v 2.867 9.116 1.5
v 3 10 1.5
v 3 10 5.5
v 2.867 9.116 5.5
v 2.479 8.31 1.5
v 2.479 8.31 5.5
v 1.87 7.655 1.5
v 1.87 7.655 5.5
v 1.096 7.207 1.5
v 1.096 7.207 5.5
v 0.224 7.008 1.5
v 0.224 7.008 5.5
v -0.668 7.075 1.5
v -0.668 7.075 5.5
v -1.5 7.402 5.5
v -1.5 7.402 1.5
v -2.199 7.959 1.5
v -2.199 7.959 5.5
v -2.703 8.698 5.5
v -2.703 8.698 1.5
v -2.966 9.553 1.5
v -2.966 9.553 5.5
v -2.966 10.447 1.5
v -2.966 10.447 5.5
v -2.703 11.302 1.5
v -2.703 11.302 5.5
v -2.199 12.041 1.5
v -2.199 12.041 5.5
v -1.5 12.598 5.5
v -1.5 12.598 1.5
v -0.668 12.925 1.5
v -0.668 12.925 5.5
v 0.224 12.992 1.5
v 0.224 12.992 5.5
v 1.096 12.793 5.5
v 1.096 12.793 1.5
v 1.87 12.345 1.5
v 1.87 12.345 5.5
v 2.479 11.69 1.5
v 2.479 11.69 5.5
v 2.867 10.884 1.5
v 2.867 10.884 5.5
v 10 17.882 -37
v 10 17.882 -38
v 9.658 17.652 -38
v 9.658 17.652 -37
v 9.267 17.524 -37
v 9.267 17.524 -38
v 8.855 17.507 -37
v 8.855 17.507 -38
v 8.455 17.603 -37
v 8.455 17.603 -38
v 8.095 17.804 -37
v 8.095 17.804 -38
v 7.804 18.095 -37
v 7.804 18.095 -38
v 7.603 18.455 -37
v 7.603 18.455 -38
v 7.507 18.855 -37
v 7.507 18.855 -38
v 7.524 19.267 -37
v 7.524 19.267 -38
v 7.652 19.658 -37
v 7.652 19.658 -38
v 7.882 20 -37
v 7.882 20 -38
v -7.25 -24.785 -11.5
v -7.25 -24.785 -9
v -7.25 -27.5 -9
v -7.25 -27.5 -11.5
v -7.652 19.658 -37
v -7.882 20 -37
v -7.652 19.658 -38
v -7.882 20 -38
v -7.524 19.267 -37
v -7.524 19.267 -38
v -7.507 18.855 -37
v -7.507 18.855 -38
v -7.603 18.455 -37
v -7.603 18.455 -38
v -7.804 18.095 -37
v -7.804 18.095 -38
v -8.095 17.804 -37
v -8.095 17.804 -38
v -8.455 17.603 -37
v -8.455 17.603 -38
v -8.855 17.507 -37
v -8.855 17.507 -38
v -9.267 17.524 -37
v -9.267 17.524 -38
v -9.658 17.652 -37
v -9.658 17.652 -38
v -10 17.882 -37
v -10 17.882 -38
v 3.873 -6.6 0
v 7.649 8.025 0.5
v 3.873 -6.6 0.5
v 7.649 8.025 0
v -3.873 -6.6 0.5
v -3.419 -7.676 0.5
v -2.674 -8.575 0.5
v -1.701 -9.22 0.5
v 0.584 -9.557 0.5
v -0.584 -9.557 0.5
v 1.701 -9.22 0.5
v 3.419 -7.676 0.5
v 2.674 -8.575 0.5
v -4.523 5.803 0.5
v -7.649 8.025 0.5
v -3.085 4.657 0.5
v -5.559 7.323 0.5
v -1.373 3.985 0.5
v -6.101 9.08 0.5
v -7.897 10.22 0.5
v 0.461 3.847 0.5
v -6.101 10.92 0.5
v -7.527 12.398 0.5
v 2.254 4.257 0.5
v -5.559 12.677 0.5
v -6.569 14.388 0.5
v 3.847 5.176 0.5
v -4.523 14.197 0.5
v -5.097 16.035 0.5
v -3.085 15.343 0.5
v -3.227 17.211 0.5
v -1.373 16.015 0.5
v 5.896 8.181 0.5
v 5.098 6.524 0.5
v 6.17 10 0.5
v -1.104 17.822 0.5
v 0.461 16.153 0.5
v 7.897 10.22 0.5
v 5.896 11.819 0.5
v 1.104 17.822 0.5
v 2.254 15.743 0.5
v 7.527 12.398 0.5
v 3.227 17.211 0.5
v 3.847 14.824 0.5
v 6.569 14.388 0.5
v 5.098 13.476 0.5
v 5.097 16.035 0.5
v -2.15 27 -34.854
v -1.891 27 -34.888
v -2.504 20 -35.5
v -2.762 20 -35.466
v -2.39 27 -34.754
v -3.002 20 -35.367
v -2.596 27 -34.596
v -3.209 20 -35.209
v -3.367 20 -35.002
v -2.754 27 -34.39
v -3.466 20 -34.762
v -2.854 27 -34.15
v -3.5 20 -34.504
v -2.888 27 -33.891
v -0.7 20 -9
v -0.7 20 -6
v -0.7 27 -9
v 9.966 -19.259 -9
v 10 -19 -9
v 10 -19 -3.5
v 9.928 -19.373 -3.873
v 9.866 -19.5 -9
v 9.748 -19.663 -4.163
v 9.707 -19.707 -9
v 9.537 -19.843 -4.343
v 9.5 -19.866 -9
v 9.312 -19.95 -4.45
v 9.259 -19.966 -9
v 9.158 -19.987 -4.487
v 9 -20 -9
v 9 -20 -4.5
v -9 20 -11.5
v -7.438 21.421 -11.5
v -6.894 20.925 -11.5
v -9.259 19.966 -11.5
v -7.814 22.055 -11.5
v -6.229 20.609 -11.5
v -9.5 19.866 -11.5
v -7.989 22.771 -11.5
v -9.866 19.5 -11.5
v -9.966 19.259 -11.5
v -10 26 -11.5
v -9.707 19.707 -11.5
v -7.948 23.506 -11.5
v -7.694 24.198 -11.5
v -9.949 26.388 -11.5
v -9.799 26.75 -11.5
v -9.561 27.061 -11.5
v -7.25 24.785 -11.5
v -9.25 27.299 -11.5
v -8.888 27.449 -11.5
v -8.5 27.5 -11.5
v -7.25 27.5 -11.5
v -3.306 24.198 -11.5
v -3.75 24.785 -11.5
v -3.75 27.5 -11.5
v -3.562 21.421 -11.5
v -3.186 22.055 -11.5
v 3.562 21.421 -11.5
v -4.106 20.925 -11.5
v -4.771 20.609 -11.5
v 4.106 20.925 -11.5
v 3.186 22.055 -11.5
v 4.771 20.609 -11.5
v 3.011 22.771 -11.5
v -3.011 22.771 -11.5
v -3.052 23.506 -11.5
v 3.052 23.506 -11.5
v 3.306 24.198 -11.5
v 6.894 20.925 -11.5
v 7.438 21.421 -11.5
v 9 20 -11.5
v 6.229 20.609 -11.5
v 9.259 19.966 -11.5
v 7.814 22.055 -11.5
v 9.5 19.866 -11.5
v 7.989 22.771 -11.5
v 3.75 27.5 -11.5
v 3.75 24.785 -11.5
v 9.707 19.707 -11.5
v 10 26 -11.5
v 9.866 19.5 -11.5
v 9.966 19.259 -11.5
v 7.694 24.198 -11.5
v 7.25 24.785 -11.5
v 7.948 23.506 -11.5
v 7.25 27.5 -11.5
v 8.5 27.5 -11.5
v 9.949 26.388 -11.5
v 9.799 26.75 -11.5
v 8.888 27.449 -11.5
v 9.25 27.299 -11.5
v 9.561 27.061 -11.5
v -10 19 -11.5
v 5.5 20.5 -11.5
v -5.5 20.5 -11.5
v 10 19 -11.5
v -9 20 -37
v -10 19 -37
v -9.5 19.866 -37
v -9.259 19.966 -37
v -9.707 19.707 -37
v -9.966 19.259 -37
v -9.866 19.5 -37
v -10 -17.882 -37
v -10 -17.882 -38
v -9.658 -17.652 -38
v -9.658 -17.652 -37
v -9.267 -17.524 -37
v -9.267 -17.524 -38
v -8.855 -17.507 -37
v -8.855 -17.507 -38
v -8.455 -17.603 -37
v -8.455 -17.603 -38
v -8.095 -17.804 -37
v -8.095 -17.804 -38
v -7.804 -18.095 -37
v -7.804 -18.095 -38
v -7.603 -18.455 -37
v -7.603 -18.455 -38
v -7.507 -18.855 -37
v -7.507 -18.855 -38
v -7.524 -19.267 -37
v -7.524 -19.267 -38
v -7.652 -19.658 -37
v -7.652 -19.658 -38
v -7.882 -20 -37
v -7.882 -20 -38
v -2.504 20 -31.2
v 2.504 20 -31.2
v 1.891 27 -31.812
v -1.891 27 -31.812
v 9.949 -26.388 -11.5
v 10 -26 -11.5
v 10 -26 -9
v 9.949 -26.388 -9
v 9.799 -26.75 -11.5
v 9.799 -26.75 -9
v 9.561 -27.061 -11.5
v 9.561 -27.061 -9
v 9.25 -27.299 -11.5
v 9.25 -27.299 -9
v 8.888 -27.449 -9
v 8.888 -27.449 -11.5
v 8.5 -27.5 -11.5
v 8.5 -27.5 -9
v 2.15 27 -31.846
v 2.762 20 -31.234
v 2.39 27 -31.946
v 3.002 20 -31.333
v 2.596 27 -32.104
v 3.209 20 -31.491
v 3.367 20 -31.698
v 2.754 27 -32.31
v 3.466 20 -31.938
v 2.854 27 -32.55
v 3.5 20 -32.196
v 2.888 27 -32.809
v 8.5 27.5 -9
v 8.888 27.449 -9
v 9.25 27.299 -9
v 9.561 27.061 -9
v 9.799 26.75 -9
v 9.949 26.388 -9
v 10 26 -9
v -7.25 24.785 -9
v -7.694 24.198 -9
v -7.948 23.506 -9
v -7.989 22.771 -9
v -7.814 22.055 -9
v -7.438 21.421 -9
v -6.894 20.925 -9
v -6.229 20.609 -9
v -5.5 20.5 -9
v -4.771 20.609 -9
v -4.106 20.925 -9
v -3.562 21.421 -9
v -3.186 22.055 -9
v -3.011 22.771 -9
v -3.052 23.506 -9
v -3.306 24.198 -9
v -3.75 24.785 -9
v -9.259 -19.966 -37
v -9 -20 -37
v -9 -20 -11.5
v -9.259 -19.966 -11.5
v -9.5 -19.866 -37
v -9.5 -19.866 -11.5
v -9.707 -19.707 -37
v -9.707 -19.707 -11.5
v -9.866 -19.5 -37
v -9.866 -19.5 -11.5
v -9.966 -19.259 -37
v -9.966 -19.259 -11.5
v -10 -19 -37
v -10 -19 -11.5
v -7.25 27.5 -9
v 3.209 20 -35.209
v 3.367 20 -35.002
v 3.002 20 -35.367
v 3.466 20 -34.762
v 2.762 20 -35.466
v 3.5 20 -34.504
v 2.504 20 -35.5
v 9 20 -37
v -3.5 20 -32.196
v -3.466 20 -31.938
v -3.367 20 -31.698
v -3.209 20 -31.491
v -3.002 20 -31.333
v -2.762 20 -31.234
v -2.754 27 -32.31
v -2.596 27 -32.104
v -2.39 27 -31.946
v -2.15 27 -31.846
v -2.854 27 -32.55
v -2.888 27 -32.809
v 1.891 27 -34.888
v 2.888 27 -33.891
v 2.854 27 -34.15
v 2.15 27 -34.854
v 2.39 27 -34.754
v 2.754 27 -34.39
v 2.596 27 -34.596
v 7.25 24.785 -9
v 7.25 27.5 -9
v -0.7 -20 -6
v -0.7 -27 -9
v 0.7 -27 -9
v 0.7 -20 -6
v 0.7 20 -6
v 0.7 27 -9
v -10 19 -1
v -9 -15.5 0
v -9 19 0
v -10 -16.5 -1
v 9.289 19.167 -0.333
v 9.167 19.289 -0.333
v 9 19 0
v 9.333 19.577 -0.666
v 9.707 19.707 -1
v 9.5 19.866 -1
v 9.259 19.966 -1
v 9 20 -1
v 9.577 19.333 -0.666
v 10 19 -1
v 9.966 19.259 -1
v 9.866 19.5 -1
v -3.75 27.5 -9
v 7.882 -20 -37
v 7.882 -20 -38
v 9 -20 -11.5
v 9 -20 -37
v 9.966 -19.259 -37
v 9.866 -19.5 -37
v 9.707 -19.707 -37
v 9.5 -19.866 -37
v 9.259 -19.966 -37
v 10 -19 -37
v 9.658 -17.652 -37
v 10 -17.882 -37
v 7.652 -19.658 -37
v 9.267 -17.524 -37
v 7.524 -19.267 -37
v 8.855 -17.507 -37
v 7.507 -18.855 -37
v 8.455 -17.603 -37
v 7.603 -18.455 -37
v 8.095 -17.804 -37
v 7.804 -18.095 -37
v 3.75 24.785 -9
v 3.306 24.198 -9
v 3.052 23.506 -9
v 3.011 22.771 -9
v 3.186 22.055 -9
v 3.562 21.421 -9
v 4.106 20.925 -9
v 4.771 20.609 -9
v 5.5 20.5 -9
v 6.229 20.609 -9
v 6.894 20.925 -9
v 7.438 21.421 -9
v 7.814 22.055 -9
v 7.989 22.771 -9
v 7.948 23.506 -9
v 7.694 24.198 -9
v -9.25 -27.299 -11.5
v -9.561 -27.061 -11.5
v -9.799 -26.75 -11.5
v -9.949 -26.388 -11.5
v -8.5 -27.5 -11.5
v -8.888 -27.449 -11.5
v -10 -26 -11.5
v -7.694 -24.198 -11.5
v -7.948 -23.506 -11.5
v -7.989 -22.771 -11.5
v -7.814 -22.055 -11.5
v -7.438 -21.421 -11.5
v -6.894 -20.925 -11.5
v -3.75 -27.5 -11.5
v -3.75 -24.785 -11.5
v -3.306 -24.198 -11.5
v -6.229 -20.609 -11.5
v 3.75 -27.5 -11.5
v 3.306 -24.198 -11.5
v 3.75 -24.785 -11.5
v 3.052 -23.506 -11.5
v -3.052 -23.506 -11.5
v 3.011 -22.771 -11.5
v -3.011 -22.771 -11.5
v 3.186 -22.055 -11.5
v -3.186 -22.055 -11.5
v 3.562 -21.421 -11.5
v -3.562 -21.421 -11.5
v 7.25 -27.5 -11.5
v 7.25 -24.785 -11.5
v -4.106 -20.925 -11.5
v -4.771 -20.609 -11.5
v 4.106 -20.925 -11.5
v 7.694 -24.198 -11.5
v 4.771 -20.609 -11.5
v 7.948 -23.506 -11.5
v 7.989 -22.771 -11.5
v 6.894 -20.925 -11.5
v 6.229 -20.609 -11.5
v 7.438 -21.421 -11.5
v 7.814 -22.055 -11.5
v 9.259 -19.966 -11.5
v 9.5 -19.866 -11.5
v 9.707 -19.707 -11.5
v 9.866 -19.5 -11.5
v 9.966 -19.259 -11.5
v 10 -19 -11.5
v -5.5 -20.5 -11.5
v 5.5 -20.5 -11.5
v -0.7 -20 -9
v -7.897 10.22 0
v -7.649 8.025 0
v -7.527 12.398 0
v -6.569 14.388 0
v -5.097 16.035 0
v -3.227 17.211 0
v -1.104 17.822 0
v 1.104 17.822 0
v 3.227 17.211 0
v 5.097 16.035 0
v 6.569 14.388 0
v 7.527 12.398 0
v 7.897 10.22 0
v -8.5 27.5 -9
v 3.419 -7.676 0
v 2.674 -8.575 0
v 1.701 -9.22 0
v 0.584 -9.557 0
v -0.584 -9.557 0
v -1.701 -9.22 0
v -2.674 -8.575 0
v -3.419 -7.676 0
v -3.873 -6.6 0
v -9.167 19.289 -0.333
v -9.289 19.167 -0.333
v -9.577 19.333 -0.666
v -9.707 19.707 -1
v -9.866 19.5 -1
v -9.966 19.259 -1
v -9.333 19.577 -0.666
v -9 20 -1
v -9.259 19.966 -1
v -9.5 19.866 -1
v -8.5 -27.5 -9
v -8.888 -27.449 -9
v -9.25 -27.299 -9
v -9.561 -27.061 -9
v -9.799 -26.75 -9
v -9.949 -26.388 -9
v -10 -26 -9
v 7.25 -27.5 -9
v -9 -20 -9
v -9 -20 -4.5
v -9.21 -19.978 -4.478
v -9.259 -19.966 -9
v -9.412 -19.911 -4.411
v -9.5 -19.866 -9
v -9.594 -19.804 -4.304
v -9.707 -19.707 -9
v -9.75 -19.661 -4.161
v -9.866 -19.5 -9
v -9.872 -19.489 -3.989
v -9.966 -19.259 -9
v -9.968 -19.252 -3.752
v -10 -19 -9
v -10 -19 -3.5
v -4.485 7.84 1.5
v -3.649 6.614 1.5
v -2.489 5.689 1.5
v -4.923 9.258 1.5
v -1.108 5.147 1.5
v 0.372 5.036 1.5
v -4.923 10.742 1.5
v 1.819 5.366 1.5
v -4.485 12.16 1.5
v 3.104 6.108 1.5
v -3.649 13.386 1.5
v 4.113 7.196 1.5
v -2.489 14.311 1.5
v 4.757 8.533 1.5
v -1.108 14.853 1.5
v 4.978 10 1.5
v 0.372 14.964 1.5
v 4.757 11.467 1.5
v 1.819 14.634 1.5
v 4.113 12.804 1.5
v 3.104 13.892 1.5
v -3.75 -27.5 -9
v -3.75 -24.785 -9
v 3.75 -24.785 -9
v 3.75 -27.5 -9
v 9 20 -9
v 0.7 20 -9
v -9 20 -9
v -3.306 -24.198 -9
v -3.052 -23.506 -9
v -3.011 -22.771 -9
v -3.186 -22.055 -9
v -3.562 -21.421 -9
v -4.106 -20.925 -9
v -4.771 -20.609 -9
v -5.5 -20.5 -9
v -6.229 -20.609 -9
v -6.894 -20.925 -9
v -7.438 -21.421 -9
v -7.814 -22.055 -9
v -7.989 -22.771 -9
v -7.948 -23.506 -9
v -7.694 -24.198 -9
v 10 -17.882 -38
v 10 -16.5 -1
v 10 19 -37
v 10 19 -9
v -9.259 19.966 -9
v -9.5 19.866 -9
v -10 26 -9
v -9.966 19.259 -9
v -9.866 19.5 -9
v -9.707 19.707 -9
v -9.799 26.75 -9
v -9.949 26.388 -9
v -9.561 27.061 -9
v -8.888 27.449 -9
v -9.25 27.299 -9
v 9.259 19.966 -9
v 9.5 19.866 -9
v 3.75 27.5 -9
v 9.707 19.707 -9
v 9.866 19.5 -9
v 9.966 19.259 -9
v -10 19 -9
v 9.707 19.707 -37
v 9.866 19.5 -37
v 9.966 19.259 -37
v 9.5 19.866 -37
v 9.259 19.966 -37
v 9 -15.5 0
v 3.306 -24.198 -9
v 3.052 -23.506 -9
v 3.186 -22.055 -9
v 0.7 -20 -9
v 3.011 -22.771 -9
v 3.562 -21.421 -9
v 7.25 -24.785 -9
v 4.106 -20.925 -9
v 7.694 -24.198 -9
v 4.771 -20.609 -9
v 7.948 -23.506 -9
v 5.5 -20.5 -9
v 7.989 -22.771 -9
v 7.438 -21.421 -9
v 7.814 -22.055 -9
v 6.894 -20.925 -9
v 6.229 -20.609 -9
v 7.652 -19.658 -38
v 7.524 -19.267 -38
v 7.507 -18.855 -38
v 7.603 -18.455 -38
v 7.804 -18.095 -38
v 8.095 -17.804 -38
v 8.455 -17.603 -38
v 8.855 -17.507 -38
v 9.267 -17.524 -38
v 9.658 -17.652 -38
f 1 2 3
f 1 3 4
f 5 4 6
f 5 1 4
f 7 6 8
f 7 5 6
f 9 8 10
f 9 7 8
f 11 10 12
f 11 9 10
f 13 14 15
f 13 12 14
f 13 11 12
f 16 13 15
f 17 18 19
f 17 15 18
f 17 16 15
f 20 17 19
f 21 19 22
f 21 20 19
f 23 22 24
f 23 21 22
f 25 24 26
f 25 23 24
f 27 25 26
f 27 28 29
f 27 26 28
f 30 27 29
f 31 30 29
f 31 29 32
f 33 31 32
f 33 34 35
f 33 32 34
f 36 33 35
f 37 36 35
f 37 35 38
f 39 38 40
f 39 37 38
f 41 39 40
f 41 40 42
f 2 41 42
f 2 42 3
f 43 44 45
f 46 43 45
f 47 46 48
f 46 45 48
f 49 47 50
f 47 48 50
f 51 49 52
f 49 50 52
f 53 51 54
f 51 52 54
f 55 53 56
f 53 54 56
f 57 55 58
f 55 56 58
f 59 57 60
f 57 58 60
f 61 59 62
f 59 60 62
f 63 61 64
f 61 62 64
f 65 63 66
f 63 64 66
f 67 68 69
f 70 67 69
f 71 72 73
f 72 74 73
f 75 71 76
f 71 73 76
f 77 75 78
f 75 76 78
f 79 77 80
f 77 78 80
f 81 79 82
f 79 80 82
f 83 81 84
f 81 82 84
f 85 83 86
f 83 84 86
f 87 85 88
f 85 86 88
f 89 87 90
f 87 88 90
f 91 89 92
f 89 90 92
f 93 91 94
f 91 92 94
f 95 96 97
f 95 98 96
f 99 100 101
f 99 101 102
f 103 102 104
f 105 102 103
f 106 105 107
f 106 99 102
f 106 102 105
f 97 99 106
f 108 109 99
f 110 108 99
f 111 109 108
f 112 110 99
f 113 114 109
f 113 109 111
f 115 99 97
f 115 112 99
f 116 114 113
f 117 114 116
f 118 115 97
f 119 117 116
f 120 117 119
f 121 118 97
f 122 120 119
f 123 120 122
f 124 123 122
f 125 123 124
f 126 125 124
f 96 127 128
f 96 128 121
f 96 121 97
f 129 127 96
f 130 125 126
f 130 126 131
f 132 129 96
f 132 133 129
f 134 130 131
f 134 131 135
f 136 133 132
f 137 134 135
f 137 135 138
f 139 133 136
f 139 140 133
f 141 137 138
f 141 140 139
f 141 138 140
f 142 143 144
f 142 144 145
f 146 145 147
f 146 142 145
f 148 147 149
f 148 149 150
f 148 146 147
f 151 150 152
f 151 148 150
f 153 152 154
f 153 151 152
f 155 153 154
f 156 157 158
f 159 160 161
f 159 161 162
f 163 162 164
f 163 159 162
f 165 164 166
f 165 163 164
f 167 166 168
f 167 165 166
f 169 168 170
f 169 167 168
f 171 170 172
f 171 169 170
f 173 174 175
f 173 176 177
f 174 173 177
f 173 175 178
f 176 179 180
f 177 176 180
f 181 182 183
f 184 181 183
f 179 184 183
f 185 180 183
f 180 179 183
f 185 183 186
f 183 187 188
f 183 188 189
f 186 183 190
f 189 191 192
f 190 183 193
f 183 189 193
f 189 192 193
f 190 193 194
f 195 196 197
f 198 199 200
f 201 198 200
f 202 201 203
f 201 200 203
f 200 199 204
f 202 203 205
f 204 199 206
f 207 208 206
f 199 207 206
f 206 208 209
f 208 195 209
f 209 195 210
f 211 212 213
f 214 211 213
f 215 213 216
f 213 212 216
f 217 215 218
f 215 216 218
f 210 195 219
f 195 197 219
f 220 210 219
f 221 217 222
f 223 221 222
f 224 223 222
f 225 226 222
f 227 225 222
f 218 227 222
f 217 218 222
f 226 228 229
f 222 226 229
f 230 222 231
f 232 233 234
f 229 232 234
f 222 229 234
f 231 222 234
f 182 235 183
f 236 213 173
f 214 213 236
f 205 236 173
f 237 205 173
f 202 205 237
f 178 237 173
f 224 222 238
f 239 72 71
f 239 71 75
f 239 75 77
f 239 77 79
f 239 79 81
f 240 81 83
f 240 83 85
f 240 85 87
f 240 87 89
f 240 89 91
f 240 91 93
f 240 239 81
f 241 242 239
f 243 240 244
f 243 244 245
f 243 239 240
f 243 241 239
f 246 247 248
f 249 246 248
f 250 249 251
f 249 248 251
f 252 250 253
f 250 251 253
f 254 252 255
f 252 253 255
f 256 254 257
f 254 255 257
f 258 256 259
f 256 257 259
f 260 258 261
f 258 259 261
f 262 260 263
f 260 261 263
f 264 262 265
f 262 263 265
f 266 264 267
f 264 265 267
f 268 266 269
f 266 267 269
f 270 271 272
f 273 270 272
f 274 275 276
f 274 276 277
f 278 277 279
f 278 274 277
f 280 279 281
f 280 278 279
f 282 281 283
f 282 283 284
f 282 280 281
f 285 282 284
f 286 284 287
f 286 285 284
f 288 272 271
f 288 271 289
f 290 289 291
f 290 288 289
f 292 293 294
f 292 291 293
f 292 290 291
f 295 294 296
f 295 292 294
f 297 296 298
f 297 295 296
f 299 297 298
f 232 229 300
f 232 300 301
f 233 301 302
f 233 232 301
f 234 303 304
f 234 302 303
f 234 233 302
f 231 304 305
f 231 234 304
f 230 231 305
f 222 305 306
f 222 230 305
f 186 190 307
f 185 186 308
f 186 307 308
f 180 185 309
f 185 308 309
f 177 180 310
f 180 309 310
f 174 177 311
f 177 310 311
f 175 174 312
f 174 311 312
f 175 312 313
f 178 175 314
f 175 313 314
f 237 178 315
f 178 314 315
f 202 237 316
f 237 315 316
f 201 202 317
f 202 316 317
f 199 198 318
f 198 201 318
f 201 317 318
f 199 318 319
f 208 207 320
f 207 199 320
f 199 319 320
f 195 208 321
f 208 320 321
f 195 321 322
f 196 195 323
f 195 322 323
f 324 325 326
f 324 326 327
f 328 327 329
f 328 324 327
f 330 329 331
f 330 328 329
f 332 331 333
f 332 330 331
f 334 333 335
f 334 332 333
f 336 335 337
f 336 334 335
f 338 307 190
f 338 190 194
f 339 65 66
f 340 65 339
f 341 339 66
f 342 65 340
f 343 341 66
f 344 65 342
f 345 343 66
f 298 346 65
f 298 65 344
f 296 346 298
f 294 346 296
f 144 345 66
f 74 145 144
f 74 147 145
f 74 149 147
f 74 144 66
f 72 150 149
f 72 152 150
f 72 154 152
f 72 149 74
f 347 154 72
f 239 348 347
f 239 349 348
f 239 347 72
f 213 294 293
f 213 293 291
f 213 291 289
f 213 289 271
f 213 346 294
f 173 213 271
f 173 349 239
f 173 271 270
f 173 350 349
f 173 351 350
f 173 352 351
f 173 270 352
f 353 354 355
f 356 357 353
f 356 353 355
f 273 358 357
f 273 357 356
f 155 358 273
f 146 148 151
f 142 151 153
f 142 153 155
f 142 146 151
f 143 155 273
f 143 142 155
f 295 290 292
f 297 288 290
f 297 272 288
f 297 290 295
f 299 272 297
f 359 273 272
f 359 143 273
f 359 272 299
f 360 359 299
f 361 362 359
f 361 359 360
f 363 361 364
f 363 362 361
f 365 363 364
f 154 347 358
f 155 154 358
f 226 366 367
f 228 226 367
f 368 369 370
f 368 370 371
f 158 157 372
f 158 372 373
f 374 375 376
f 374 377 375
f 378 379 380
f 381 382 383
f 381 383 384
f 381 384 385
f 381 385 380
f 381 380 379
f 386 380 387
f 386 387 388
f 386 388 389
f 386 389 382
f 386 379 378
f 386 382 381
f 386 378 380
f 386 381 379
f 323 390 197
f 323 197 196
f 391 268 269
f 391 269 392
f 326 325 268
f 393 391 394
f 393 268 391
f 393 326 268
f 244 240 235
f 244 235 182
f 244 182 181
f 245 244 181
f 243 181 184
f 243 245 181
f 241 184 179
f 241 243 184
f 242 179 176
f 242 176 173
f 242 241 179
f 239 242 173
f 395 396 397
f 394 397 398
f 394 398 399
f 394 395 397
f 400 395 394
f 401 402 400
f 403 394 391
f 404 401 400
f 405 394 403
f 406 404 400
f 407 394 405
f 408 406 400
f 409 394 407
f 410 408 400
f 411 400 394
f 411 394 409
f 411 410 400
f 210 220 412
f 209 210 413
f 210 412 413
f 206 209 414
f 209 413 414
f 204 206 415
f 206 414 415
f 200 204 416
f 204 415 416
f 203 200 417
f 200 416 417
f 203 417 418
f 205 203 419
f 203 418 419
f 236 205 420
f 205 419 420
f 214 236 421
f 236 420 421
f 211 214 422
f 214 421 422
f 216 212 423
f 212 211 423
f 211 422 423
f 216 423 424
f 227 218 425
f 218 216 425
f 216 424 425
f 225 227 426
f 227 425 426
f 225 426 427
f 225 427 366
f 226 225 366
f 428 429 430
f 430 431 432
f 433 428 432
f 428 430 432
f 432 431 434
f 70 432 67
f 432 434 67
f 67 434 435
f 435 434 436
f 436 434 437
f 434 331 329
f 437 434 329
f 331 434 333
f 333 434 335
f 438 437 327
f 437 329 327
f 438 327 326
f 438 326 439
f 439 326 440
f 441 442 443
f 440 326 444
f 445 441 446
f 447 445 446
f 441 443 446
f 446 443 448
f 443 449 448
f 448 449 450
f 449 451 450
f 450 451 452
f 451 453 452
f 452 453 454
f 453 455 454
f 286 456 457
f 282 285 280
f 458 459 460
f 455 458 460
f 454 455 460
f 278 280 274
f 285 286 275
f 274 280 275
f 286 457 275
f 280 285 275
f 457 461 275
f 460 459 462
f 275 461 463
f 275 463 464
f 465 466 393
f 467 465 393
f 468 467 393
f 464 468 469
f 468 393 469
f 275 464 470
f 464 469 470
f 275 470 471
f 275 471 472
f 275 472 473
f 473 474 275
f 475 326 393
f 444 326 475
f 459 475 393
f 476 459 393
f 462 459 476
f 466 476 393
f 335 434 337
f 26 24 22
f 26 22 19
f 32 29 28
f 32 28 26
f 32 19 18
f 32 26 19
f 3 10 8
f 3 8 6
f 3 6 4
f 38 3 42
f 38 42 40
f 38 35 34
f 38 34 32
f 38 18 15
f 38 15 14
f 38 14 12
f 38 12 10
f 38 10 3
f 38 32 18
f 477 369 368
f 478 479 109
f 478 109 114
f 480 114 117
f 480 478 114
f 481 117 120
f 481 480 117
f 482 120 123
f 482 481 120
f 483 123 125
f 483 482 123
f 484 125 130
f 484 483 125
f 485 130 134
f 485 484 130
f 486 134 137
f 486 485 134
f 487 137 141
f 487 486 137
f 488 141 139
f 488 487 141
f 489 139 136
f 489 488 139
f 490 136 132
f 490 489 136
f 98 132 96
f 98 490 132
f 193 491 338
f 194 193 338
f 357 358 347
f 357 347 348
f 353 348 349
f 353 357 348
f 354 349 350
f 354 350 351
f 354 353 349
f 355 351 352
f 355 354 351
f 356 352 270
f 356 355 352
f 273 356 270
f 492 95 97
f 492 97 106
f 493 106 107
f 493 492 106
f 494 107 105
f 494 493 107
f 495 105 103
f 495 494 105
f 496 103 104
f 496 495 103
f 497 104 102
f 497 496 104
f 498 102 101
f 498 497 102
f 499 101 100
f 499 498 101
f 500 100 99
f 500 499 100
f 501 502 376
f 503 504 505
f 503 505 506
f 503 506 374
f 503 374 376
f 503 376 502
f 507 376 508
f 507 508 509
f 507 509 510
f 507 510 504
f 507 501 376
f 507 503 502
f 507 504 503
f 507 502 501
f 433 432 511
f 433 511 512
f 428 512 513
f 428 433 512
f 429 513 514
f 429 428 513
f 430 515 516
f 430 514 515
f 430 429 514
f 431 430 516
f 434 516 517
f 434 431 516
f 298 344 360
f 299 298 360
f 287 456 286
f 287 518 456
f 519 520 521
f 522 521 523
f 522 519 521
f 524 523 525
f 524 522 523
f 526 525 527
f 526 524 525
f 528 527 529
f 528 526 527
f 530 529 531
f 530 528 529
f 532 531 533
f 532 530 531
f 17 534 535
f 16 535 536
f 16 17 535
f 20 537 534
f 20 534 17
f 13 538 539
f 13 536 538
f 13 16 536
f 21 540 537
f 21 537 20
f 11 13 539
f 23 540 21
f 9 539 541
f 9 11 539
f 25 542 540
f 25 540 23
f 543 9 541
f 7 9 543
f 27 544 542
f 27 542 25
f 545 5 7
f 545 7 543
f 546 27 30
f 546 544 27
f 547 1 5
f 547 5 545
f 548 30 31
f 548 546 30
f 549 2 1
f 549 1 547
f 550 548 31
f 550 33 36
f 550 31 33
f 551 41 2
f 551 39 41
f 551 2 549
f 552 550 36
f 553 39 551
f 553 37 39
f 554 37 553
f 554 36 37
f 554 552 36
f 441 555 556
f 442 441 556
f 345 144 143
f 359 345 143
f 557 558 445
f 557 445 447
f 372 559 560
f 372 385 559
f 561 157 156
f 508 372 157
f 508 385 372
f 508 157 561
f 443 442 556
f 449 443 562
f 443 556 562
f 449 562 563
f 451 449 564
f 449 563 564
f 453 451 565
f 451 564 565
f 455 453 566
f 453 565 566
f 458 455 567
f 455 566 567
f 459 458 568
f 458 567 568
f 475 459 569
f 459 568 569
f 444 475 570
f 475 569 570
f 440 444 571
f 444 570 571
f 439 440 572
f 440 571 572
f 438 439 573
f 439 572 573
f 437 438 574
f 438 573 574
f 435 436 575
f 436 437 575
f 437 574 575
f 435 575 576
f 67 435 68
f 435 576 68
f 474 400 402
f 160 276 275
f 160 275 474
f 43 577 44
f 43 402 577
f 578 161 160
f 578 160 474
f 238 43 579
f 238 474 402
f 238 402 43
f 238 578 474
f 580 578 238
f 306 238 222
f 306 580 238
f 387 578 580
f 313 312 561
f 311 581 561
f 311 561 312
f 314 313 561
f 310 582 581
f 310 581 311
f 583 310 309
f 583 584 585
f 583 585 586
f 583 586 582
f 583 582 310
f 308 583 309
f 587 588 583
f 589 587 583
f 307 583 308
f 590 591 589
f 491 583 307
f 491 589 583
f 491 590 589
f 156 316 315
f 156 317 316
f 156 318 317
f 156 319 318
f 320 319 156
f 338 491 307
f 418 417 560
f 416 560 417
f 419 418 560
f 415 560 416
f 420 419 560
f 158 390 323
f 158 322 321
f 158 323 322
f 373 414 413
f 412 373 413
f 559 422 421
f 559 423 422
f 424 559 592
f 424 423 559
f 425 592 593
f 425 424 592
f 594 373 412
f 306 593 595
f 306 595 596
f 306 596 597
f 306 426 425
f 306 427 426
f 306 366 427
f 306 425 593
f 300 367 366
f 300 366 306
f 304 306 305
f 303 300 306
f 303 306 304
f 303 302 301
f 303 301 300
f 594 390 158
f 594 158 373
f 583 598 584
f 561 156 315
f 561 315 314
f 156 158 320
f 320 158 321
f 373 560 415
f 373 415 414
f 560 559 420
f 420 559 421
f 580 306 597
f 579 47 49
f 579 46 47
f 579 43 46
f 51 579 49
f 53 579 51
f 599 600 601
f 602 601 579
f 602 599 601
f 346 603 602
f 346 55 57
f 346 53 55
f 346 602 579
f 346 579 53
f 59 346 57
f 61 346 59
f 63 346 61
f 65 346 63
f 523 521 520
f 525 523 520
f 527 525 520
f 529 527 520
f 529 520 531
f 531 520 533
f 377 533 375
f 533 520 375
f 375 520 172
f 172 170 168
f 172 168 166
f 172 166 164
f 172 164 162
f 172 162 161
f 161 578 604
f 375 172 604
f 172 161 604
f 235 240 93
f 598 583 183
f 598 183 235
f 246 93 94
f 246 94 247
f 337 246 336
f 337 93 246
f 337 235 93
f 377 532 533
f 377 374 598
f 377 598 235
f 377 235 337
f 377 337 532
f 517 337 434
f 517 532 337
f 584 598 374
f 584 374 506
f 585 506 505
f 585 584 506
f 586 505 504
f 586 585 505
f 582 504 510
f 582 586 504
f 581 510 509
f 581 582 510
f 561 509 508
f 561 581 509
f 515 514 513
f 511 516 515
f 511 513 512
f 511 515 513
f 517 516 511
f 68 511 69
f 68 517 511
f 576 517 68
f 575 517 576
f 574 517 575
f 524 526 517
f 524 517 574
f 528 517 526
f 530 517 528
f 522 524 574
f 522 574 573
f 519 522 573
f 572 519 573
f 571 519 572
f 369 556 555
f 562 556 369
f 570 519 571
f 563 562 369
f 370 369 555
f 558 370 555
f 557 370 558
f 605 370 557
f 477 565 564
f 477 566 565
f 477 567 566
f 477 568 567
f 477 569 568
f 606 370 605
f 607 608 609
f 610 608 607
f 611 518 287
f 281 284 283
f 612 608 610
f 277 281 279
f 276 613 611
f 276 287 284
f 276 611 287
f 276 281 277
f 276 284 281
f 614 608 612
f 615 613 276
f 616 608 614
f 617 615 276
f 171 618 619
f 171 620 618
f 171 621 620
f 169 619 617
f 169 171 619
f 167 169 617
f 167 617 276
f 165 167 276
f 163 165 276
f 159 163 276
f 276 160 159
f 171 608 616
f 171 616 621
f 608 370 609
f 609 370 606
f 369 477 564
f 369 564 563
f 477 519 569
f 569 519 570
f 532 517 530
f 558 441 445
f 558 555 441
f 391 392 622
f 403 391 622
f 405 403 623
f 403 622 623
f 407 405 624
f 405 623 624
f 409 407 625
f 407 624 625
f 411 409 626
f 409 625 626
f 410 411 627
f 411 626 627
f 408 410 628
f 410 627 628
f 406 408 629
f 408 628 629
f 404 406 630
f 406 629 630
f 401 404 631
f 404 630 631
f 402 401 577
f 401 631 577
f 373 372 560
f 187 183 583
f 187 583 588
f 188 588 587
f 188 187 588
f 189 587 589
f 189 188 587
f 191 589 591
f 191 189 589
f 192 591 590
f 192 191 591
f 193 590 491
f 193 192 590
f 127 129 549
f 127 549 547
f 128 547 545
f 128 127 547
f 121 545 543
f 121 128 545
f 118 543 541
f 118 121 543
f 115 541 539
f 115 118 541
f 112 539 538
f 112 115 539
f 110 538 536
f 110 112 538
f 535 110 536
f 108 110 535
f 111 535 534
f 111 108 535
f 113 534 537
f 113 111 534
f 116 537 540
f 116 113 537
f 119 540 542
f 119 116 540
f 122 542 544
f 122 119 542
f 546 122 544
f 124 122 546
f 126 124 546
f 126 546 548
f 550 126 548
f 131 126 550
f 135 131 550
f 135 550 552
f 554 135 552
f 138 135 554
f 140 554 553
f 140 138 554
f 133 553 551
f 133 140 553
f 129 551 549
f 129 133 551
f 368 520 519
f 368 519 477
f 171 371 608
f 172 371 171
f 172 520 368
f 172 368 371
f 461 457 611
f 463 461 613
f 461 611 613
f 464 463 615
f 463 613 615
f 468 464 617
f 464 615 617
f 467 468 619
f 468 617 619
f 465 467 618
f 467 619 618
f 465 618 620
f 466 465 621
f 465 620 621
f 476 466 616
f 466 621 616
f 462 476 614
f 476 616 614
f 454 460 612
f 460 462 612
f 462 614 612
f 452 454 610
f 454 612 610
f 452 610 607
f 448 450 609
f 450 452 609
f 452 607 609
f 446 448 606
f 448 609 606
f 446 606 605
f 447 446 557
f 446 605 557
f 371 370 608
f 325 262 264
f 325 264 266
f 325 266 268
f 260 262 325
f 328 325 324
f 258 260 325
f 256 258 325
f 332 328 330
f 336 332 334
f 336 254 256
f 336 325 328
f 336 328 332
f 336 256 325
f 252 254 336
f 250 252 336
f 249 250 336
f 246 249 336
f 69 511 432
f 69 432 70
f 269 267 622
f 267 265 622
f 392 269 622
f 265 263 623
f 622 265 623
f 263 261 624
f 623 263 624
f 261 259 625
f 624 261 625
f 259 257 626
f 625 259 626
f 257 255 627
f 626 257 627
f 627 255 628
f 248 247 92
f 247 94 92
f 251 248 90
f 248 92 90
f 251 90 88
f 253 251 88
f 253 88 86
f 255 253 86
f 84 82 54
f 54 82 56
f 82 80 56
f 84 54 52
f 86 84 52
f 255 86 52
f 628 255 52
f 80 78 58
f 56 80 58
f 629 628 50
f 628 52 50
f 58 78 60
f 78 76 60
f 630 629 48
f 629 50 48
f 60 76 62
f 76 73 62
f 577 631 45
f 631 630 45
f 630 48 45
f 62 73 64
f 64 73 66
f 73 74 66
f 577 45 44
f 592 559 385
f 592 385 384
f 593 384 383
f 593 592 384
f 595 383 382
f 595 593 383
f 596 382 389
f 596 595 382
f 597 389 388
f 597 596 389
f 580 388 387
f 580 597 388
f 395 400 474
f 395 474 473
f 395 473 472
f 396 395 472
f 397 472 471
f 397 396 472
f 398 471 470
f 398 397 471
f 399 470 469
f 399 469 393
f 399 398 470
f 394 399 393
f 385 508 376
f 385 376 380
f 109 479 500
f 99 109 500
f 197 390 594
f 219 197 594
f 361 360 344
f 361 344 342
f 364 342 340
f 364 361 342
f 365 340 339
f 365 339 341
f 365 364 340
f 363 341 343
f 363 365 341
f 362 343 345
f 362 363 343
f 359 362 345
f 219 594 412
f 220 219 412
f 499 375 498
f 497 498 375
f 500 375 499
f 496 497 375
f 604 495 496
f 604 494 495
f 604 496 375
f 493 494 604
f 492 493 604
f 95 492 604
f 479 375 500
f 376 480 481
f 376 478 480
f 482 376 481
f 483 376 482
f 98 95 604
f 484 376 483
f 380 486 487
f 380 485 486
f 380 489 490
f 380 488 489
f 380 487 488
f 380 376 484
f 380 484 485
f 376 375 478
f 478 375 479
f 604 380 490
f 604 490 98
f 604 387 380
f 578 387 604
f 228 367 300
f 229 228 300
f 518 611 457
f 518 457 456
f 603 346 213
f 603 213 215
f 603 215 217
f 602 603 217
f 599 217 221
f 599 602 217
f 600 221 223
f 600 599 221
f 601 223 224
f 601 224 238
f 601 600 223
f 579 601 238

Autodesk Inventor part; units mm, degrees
ref_plane "YZ Plane" through (0, 0, 0) normal (1, 0, 0) x (0, 1, 0)
ref_plane "XZ Plane" through (0, 0, 0) normal (0, 1, 0) x (-1, 0, 0)
sketch "Sketch1" plane through (0, 0, 0) normal (0, 0, 1) x (1, 0, 0)
  line L0 (-10, -20) -> (10, -20)
  line L1 (10, -20) -> (10, 20)
  line L2 (10, 20) -> (-10, 20)
  line L3 (-10, 20) -> (-10, -20)
  line L4 (-10, -20) -> (10, 20) construction
  line L5 (10, -20) -> (-10, 20) construction
  point P0 (0, 0)
  dimension "d0" = 40
  dimension "d1" = 20
extrude "Extrusion1" add sketch "Sketch1" against normal blind 38
fillet "Fillet2" radius 1 4 edges at (-10, 20, -19) (10, 20, -19) (-10, -20, -19) (10, -20, -19)
ref_plane "Work Plane1" through (0, 0, -9) normal (0, 0, 1) x (1, 0, 0)
sketch "Sketch2" plane through (0, 0, -9) normal (0, 0, 1) x (1, 0, 0)
  line L0 (10, -19) -> (-10, -19)
  line L1 (-10, -19) -> (-10, -27.5)
  line L2 (-10, -27.5) -> (10, -27.5)
  line L3 (10, -27.5) -> (10, -19)
  line L4 (-10, 19) -> (-10, -19) projected
  line L5 (-9, -20) -> (9, -20) projected
  line L6 (10, 19) -> (10, -19) projected
  line L7 (10, 0) -> (-10, 0)
  line L8 (10, 19) -> (-10, 19)
  line L9 (-10, 19) -> (-10, 27.5)
  line L10 (-10, 27.5) -> (10, 27.5)
  line L11 (10, 27.5) -> (10, 19)
  line L12 (10, -23) -> (-10, -23) construction
  line L13 (0, -27.5) -> (0, -20) construction
  circle A0 centre (5.5, -23) radius 2.5
  line L14 (8, -20.5) -> (3, -20.5) construction
  line L15 (3, -20.5) -> (3, -25.5) construction
  line L16 (3, -25.5) -> (8, -25.5) construction
  line L17 (8, -25.5) -> (8, -20.5) construction
  line L18 (8, -20.5) -> (3, -25.5) construction
  line L19 (3, -20.5) -> (8, -25.5) construction
  line L20 (7.25, -27.5) -> (3.75, -27.5)
  line L21 (3.75, -27.5) -> (3.75, -24.7854)
  line L22 (3.75, -24.7854) -> (7.25, -24.7854)
  line L23 (7.25, -24.7854) -> (7.25, -27.5)
  line L24 (5.5, -24.7854) -> (5.5, -23) construction
  circle A1 centre (-5.5, -23) radius 2.5
  line L25 (-3.75, -27.5) -> (-3.75, -24.7854)
  line L26 (-7.25, -24.7854) -> (-7.25, -27.5)
  circle A2 centre (5.5, 23) radius 2.5
  line L27 (3.75, 27.5) -> (3.75, 24.7854)
  line L28 (7.25, 24.7854) -> (7.25, 27.5)
  line L29 (-7.25, 24.7854) -> (-7.25, 27.5)
  line L30 (-3.75, 27.5) -> (-3.75, 24.7854)
  circle A3 centre (-5.5, 23) radius 2.5
  point P0 (0, 0)
  dimension "d8" = 5
  dimension "d7" = 7.5
  dimension "d9" = 2
  dimension "d10" = 2
  dimension "d11" = 3.5
extrude "Extrusion2" add sketch "Sketch2" against normal blind 2.5 contours L3 L2 L23 A0 L21 L25 A1 L26 L1 L0 | L8 L9 L10 L29 A3 L30 L27 A2 L28 L11
fillet "Fillet3" radius 1.5 4 edges at (-10, 27.5, -10.25) (10, 27.5, -10.25) (-10, -27.5, -10.25) (10, -27.5, -10.25)
sketch "Sketch3" plane through (0, 0, -38) normal (0, 0, -1) x (-1, 0, 0)
  arc A0 (-10, -19) -> (-9, -20) centre (-9, -19) ccw projected
  line L0 (-9, -20) -> (9, -20) projected
  arc A1 (9, -20) -> (10, -19) centre (9, -19) ccw projected
  line L1 (10, -19) -> (10, 19) projected
  arc A2 (10, 19) -> (9, 20) centre (9, 19) ccw projected
  line L2 (9, 20) -> (-9, 20) projected
  arc A3 (-9, 20) -> (-10, 19) centre (-9, 19) ccw projected
  line L3 (-10, 19) -> (-10, -19) projected
  circle A4 centre (9, 19) radius 1.5
  circle A5 centre (-9, 19) radius 1.5
  circle A6 centre (9, -19) radius 1.5
  circle A7 centre (-9, -19) radius 1.5
  point P0 (0, 0)
  dimension "d15" = 3
extrude "Extrusion3" cut sketch "Sketch3" against normal blind 1 contours L3 A7 L0 A0 | A0 L0 A7 L3 | A5 L2 A3 L3 | L3 A3 L2 A5 | A6 L1 A1 L0 | L0 A1 L1 A6 | A4 L1 A2 L2 | L2 A2 L1 A4
sketch "Sketch4" plane through (10, -19, 0) normal (1, 0, 0) x (0, 0, -1)
  line L0 (9, 0) -> (9, -7) projected
  line L1 (9, 39) -> (9, 38) projected
  line L2 (9, 0) -> (9, 38) construction
  line L3 (9, -1) -> (0, -1) projected
  line L4 (4.5, -1) -> (0, 3.5)
  line L5 (0, 0) -> (0, 38) projected
  line L6 (0, -1) -> (0, 0) projected
  point P0 (0, 19)
  dimension "d18" = 4.5
  dimension "d19" = 4.5
extrude "Extrusion4" cut sketch "Sketch4" against normal through all
sketch "Sketch5" plane through (0, 0, 0) normal (0, 0, 1) x (1, 0, 0)
  circle A0 centre (0, 10) radius 7.9
  line L0 (10, -15.5) -> (10, 19) projected
  line L1 (-10, 19) -> (-10, -15.5) projected
  line L2 (9, 20) -> (-9, 20) projected
  line L3 (0, 17.9) -> (0, -5.6)
  circle A1 centre (0, -5.6) radius 4
  line L4 (7.6491, 8.025) -> (3.873, -6.6)
  line L5 (-7.6491, 8.025) -> (-3.873, -6.6)
  point P0 (0, 0)
  dimension "d22" = 15.8
  dimension "d23" = 10
  dimension "d24" = 10
  dimension "d25" = 10
  dimension "d26" = 23.5
  dimension "d27" = 8
extrude "Extrusion5" add sketch "Sketch5" along normal blind 0.5
sketch "Sketch6" plane through (0, 0, 0.5) normal (0, 0, 1) x (1, 0, 0)
  arc A0 (7.6491, 8.025) -> (-7.6491, 8.025) centre (0, 10) ccw projected
  circle A1 centre (0, 10) radius 6.17
  point P0 (0, 0)
  dimension "d30" = 12.34
extrude "Extrusion6" add sketch "Sketch6" along normal blind 1 draft -50
sketch "Sketch7" plane through (0, 10, 1.5) normal (0, 0, 1) x (1, 0, 0)
  circle A0 centre (0, 0) radius 4.9782 projected
  circle A1 centre (0, 0) radius 3
  point P0 (0, -10)
  dimension "d33" = 6
extrude "Extrusion7" add sketch "Sketch7" along normal blind 4 contours A1
sketch "Sketch8" plane through (0, 0, 0) normal (1, 0, 0) x (0, 1, 0)
  line L0 (-24.7854, -9) -> (-27.5, -9) projected
  line L1 (-27, -9) -> (-20, -6)
  line L2 (-20, -9) -> (-20, -4.5) projected
  line L3 (-20, -9) -> (-20, -6)
  line L4 (-20, -9) -> (-27, -9)
  point P0 (0, 0)
  dimension "d36" = 3
  dimension "d37" = 7
extrude "Extrusion8" add sketch "Sketch8" along normal mid plane 1.4
mirror "Mirror1" about plane through (0, 0, 0) normal (0, 1, 0) of "Extrusion8"
sketch "Sketch9" plane through (-9, 20, -11.5) normal (0, 1, 0) x (1, 0, 0)
  line L0 (5.25, 0) -> (12.75, 0) projected
  line L1 (9, 0) -> (9, 26.5) construction
  line L2 (1.118, 26.5) -> (16.882, 26.5) projected
  line L3 (12.5, 19.7) -> (5.5, 19.7)
  line L4 (5.5, 19.7) -> (5.5, 24)
  line L5 (5.5, 24) -> (12.5, 24)
  line L6 (12.5, 24) -> (12.5, 19.7)
  line L7 (12.5, 19.7) -> (5.5, 24) construction
  line L8 (5.5, 19.7) -> (12.5, 24) construction
  point P0 (9, -11.5)
  point P1 (9, 21.85)
  dimension "d40" = 2.5
  dimension "d41" = 7
  dimension "d42" = 4.3
extrude "Extrusion9" add sketch "Sketch9" along normal blind 7 draft -5
fillet "Fillet4" radius 1 4 edges at (3.1938, 23.5, -31.5062) (3.1938, 23.5, -35.1938) (-3.1938, 23.5, -31.5062) (-3.1938, 23.5, -35.1938)
chamfer "Chamfer1" distance 1 angle 45 5 edges at (0, 20, 0) (-9.7071, 19.7071, 0) (-10, 1.75, 0) (9.7071, 19.7071, 0) (10, 1.75, 0)
equation "\"d10\" = d9"
equation "\"d19\" = d18"
equation "\"d24\" = d23"
equation "\"d25\" = d23"
properties part number "DatanS1213AnalogFeedback"
